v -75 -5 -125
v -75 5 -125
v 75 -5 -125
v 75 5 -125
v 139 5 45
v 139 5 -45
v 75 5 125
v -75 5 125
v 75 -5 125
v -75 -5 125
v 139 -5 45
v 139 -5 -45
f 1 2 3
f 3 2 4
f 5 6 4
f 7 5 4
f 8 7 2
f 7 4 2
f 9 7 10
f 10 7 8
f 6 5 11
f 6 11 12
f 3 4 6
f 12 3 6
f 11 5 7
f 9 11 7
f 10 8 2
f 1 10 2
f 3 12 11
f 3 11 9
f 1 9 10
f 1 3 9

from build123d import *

# Parameters (mm, degrees)
BOSS_EXTRUDE1_DEPTH = 5
SKETCH3_W           = 36
SKETCH3_H           = 90
CUT_EXTRUDE1_DEPTH  = 10


with BuildPart() as part:
    # Sketch1 → Boss-Extrude1 (new, symmetric)
    with BuildSketch(Plane(origin=(0, 0, 0), x_dir=(1, 0, 0), z_dir=(0, 1, 0))):
        Polygon((75, 125), (175, 0), (75, -125), (-75, -125), (-75, 125), align=None)
    extrude(amount=BOSS_EXTRUDE1_DEPTH, both=True)

    # Sketch3 → Cut-Extrude1 (cut)
    with BuildSketch(Plane(origin=(0, 5, 0), x_dir=(1, 0, 0), z_dir=(0, 1, 0))):
        with Locations((157, 0)):
            Rectangle(SKETCH3_W, SKETCH3_H)
    extrude(amount=-CUT_EXTRUDE1_DEPTH, mode=Mode.SUBTRACT)


solid = part.part
